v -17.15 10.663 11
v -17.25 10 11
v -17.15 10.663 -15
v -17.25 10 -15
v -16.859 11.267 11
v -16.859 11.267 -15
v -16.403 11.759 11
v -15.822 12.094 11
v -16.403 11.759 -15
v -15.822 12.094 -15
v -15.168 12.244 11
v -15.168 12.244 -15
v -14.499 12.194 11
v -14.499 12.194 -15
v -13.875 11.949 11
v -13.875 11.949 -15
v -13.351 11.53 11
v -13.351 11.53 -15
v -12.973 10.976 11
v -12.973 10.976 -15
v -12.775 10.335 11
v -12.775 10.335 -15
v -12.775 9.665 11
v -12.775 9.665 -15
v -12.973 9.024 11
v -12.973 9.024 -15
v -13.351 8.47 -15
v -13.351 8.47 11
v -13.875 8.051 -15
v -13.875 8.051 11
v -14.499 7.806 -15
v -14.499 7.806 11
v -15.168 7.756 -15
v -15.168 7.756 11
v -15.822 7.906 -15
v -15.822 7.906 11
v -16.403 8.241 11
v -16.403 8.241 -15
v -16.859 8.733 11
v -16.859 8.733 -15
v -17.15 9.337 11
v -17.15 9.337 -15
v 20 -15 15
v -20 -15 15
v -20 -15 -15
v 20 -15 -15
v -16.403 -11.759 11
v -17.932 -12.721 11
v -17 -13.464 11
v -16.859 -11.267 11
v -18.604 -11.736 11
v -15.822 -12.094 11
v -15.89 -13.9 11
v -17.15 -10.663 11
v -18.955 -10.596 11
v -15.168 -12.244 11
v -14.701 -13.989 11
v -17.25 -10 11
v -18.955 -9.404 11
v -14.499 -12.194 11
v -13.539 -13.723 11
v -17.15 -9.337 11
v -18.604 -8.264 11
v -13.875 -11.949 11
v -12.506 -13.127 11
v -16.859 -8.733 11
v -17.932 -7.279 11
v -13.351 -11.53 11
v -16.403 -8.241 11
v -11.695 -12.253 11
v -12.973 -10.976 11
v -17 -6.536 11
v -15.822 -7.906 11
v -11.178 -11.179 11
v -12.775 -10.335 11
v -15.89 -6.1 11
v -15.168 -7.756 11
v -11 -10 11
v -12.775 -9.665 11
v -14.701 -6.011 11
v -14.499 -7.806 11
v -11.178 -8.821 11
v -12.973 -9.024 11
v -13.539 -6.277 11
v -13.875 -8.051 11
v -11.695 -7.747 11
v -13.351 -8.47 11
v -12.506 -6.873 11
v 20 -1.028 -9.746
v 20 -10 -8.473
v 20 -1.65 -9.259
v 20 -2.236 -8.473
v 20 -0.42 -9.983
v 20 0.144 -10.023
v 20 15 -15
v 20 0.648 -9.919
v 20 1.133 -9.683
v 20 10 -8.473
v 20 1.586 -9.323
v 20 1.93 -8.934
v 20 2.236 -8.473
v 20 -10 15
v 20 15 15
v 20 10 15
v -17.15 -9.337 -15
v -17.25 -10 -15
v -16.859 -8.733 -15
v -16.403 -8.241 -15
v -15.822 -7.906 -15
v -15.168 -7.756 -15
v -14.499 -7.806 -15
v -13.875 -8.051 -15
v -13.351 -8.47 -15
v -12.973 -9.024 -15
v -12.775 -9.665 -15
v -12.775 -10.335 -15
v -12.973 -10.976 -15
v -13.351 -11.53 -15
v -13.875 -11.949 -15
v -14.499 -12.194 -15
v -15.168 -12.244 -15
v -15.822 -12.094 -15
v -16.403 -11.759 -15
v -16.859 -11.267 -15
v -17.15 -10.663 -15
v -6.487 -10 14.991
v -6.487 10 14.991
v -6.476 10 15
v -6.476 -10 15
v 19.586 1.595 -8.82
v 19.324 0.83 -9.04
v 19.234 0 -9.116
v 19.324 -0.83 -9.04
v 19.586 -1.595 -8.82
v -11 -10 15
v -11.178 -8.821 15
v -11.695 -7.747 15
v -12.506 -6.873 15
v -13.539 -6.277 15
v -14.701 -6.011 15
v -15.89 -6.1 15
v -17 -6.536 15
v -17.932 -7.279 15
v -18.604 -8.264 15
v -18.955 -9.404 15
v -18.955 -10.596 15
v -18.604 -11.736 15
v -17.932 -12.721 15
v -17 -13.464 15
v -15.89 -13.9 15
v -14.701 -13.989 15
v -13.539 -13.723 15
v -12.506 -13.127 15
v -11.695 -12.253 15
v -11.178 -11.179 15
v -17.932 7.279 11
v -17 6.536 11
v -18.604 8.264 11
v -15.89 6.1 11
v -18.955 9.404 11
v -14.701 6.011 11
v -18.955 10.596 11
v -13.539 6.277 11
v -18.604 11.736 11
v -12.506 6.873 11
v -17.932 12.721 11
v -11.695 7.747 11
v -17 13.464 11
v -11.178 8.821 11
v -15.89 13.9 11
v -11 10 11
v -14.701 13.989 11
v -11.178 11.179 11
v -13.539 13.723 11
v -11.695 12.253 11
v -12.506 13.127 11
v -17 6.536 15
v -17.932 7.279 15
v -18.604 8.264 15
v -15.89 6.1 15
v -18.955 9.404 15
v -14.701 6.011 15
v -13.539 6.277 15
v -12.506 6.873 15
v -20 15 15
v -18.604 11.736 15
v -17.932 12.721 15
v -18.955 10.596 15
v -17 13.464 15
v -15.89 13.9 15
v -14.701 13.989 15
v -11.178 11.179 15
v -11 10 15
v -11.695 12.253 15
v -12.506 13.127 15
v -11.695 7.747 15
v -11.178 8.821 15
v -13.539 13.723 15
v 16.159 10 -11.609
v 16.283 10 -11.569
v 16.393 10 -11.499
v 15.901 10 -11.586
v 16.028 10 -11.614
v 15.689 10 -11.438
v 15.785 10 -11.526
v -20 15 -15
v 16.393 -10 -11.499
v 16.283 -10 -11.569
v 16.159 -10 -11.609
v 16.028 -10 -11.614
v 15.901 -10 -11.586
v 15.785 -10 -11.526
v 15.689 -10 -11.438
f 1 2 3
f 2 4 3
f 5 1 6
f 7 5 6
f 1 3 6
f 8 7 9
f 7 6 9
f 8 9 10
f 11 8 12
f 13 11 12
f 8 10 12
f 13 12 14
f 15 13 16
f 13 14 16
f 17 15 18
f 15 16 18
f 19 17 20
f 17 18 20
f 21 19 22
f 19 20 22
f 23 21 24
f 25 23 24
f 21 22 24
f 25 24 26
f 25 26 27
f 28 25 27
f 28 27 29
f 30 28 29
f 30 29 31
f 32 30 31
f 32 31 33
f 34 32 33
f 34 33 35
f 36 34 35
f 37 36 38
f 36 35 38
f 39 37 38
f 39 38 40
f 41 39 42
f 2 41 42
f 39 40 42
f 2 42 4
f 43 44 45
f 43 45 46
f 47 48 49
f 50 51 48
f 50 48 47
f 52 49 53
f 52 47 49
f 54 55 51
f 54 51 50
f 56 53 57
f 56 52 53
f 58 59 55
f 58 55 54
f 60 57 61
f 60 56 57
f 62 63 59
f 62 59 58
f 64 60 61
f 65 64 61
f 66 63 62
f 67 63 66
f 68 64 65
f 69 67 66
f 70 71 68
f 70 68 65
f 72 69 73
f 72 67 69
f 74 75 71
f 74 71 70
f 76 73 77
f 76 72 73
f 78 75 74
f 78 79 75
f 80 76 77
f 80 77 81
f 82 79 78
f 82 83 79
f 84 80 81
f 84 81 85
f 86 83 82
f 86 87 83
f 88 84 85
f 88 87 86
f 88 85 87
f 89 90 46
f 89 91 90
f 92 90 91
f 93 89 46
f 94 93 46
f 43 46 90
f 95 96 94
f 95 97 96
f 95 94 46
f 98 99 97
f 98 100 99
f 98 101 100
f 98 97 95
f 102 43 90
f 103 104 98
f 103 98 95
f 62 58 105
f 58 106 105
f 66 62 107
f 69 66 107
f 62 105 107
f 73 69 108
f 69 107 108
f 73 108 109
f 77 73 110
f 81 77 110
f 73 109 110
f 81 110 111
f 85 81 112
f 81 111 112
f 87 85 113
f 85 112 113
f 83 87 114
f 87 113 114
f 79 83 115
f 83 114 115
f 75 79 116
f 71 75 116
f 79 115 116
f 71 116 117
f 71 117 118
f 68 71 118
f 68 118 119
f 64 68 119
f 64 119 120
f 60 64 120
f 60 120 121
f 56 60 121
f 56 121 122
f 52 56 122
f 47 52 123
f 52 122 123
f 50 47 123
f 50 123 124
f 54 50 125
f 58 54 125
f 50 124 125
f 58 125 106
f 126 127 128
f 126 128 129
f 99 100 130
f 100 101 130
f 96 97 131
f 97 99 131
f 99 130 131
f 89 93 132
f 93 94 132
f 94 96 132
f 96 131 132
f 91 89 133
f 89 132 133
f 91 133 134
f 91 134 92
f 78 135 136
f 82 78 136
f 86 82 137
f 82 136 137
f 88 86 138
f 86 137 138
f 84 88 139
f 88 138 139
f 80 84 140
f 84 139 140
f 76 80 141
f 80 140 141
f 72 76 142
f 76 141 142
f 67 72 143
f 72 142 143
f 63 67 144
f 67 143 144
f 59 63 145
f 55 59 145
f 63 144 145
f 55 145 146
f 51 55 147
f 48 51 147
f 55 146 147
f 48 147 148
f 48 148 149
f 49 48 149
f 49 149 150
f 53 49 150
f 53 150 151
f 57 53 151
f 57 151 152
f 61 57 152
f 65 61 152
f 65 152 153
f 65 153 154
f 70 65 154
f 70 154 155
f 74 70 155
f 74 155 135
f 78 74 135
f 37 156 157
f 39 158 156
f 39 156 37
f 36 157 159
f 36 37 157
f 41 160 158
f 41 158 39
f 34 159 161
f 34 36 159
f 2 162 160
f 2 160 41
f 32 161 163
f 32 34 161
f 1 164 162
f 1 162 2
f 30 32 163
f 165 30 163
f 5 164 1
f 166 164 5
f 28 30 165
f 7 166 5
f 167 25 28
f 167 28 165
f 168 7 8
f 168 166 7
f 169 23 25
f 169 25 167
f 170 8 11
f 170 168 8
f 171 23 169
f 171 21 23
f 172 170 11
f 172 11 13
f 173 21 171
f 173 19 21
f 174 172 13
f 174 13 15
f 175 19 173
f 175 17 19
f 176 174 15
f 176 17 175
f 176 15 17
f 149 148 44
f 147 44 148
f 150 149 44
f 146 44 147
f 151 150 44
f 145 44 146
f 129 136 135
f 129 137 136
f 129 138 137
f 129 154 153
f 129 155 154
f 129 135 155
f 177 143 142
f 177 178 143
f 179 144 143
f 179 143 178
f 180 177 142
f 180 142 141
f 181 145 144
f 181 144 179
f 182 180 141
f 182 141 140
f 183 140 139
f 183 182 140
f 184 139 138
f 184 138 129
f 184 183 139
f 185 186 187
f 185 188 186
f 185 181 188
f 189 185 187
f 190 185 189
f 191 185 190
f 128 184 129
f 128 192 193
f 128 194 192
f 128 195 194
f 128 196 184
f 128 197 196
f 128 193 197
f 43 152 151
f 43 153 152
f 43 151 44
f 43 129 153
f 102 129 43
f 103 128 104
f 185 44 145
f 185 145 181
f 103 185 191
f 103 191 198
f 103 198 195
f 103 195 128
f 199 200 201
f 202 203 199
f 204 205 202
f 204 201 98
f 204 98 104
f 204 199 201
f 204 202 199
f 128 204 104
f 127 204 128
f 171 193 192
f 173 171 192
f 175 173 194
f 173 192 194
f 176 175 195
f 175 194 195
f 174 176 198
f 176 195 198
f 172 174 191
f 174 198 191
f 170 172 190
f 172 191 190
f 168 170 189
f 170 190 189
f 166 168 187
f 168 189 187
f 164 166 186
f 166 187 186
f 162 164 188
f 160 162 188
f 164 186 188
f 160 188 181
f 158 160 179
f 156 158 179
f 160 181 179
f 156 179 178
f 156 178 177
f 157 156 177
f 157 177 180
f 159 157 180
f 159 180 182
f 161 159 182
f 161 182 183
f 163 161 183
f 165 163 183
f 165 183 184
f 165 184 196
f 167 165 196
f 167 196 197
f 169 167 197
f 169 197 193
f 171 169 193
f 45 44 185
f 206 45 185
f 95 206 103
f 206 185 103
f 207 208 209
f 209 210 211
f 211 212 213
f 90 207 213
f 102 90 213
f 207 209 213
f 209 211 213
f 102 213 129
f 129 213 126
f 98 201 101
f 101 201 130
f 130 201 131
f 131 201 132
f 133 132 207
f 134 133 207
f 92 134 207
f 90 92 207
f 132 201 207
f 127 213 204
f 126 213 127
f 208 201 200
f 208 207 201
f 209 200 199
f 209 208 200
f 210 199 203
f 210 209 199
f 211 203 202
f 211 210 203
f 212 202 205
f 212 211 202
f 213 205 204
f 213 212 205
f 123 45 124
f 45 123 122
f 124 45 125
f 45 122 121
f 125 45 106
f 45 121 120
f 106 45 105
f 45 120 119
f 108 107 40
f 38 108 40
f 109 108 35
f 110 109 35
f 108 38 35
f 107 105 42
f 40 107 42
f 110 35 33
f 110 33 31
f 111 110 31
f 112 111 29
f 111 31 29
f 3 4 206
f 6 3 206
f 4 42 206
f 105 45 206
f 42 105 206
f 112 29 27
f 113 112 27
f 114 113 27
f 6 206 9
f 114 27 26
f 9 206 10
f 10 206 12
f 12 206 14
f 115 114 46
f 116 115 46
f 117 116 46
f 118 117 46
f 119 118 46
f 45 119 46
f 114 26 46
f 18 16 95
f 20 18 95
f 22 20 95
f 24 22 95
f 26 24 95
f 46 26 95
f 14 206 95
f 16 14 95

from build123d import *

# Parameters (mm, degrees)
SKETCH_1_W                   = 40
SKETCH_1_H                   = 30
EXTRUDE_1_DEPTH              = 15
SKETCH_4_W                   = 35
SKETCH_4_H                   = 20
CUT_EXTRUDE_1_DEPTH          = 34.23784159
FILLET_1_R                   = 0.5
CUT_EXTRUDE_4_DEPTH          = 4
HOLE_WIZARD_M4_2_D           = 4.5
HOLE_WIZARD_M4_2_CBORE_D     = 8
HOLE_WIZARD_M4_2_CBORE_DEPTH = 4


with BuildPart() as part:
    # 草圖1 → 填料-伸長1 (new, symmetric)
    with BuildSketch(Plane.XY):
        Rectangle(SKETCH_1_W, SKETCH_1_H)
    extrude(amount=EXTRUDE_1_DEPTH, both=True)

    # 草圖4 → 除料-伸長1 (cut, through all)
    with BuildSketch(Plane(origin=(3.574759116, 0, 2.999579055), x_dir=(-0.6427876096865437, 0, 0.7660444431189745), z_dir=(0.7660444431189745, 0, 0.6427876096865437))):
        with Locations((-1.846418841, 0)):
            Rectangle(SKETCH_4_W, SKETCH_4_H)
    extrude(amount=CUT_EXTRUDE_1_DEPTH, mode=Mode.SUBTRACT)

    # 圓角1
    fillet_1_edges = [part.edges().sort_by_distance(p)[0] for p in [
        (16.010397438, 0, -11.820637592),
    ]]
    fillet(fillet_1_edges, radius=FILLET_1_R)

    # 草圖7 → 除料-伸長4 (cut)
    with BuildSketch(Plane(origin=(12.435638322, 0, -14.820216647), x_dir=(0.7660444431189746, 0, 0.6427876096865437), z_dir=(-0.6427876096865437, 0, 0.7660444431189746))):
        with BuildLine():
            Line((9.874572873, -2.236067977), (9.874572873, 2.236067977))
            ThreePointArc((9.874572873, 2.236067977), (8.874572873, 0), (9.874572873, -2.236067977))
        make_face()
    extrude(amount=-CUT_EXTRUDE_4_DEPTH, mode=Mode.SUBTRACT)

    # M4 凹頭蓋螺釘的柱孔2 (through all)
    with Locations(Plane.XY.offset(15)):
        with Locations((-15, 10), (-15, -10)):
            CounterBoreHole(HOLE_WIZARD_M4_2_D / 2, HOLE_WIZARD_M4_2_CBORE_D / 2, HOLE_WIZARD_M4_2_CBORE_DEPTH)


solid = part.part
